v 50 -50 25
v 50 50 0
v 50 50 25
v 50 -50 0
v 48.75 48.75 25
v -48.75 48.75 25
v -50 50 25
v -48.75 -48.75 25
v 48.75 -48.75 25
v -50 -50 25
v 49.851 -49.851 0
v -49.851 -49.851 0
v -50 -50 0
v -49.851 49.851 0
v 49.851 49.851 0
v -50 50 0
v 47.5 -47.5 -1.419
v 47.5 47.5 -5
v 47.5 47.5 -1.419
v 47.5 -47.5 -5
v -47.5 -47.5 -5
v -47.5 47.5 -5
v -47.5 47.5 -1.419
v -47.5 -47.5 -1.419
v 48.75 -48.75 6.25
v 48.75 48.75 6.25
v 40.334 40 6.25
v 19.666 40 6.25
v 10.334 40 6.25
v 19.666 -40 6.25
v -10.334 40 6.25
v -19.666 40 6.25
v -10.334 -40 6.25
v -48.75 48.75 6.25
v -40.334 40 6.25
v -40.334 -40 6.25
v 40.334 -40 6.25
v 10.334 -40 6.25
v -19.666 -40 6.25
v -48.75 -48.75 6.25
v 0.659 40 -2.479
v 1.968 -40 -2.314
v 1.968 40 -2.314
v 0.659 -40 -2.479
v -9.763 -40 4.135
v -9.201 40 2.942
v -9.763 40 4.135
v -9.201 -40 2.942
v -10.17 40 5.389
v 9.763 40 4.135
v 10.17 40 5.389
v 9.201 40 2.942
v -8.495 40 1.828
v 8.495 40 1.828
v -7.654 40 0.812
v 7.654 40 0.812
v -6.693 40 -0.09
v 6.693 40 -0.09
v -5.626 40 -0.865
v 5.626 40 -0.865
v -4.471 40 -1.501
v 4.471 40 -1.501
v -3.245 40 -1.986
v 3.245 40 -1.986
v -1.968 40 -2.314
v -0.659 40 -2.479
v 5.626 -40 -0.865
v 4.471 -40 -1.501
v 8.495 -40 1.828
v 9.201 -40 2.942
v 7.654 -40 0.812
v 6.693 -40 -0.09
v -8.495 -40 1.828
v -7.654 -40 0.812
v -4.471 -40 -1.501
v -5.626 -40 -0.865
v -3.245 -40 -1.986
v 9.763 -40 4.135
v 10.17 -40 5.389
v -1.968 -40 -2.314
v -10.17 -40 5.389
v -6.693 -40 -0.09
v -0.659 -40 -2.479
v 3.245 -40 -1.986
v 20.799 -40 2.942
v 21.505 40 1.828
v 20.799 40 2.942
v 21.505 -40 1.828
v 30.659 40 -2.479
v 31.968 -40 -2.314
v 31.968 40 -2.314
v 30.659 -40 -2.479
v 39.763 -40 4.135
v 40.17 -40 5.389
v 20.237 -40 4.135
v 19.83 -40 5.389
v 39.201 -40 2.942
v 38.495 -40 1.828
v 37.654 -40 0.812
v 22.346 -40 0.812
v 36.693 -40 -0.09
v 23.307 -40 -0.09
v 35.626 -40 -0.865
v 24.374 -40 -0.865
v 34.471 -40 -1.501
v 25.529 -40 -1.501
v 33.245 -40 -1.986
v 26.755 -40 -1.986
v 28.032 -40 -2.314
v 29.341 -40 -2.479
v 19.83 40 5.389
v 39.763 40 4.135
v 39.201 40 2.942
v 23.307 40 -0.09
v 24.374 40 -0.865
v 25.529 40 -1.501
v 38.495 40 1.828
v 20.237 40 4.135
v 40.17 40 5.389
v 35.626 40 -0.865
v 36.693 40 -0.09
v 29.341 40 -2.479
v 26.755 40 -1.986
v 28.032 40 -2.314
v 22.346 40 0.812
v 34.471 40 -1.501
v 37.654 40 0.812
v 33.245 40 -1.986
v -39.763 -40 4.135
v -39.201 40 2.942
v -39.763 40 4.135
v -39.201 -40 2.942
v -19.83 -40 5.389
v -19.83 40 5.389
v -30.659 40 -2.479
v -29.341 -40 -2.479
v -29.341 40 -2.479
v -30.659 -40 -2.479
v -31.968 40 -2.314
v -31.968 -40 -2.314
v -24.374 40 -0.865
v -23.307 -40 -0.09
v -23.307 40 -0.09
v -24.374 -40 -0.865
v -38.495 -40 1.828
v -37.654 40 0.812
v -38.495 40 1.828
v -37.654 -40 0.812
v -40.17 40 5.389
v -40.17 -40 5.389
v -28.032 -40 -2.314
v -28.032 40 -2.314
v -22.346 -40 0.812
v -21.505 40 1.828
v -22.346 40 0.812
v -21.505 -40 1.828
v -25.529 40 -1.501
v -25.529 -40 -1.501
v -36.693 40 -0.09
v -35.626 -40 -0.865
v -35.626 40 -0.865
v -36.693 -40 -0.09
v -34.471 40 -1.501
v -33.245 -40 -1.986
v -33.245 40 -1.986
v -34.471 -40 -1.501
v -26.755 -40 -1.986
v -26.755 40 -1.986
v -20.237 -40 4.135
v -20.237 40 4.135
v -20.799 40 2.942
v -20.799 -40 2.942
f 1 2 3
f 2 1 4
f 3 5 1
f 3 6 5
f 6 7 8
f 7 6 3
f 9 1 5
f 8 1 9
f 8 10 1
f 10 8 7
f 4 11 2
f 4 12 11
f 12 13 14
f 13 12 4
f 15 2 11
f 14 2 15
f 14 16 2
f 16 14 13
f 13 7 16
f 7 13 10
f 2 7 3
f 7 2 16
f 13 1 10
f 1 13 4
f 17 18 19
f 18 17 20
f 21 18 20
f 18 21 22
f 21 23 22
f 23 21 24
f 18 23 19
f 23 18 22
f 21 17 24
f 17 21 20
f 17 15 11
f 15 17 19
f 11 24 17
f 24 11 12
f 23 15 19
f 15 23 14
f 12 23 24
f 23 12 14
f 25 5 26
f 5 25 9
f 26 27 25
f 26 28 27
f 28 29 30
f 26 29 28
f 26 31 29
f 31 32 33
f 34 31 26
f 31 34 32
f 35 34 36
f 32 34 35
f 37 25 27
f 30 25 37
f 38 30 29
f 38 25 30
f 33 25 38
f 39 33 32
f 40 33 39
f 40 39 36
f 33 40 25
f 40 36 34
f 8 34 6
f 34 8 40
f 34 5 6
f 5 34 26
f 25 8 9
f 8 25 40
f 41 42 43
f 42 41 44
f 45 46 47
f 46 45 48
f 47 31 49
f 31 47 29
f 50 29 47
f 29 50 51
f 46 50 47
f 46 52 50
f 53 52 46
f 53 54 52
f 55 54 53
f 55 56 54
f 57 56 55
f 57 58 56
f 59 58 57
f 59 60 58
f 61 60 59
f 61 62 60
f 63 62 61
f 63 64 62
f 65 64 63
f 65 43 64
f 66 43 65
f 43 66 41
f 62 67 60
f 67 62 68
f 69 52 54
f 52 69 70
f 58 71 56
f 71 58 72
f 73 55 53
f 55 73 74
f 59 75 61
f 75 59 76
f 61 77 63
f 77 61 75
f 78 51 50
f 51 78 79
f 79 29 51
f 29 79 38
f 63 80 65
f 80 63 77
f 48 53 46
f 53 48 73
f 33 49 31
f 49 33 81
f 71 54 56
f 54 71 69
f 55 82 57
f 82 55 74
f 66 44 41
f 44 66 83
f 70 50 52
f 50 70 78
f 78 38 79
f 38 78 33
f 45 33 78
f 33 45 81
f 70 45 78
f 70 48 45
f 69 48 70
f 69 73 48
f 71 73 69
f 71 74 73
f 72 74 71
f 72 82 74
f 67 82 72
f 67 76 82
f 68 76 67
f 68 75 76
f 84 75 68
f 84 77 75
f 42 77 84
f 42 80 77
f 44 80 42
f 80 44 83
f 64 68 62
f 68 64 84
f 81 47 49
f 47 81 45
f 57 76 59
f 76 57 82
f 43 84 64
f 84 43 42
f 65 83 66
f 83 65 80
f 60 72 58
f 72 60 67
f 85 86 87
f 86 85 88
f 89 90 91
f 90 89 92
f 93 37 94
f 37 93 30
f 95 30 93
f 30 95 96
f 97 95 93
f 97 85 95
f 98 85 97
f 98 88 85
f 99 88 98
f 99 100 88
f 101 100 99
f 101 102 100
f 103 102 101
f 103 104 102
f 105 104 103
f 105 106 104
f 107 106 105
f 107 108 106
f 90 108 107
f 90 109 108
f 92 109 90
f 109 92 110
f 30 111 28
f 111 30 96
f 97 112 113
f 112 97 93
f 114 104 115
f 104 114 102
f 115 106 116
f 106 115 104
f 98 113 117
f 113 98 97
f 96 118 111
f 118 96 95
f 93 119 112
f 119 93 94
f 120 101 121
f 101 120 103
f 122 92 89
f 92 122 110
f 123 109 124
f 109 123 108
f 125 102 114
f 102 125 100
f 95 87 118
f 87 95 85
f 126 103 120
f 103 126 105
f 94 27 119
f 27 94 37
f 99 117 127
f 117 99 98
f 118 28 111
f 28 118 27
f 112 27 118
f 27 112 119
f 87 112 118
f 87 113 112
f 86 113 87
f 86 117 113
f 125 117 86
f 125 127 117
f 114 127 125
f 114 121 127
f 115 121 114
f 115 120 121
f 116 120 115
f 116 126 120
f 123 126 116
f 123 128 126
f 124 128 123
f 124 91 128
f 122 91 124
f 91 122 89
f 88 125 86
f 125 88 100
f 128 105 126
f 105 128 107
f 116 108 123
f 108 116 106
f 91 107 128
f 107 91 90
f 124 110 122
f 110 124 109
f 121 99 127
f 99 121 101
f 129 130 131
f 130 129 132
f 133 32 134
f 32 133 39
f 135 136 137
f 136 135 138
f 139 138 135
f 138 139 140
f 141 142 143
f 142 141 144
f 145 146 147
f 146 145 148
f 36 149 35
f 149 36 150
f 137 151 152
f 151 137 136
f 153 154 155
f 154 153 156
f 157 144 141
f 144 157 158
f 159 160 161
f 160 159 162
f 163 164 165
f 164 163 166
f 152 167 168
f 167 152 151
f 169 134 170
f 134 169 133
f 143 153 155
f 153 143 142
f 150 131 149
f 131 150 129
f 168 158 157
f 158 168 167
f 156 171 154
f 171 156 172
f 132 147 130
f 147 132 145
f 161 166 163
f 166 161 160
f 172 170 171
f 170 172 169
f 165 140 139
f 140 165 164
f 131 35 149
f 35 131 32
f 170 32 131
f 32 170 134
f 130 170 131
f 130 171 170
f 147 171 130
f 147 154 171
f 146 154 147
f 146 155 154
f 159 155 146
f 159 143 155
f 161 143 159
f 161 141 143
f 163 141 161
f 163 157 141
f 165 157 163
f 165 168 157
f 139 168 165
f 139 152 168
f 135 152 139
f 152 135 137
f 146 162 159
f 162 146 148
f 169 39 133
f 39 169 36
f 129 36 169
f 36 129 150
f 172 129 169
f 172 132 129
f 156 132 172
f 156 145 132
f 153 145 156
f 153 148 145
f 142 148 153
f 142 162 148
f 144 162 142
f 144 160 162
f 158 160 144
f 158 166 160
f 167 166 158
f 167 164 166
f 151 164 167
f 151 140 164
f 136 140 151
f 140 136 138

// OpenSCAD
$fn=50;
H=25;
H2=5;
SIDE=100;
D=2;
D2=2.5;

difference() {
    union() {
        translate([0,0,H/2]) cube([SIDE,SIDE,H], center=true ); // Box 100x100x40
        translate([0,0,-H2/2]) cube([SIDE-2*D2,SIDE-2*D2,H2],center=true);
        translate([0,0,-2]) rotate([0,0,45]) cylinder(h=2,d1=1.35*(SIDE-D2),d2=1.41*SIDE,$fn=4);    // Chamfer
    }
    translate([0,0, H]) cube([SIDE-D2,SIDE-D2,1.5*H],center=true);

    translate([  0,0, 8]) rotate([90,0,0]) cylinder(d=21,h=80, center=true);
    translate([ 30,0, 8]) rotate([90,0,0]) cylinder(d=21,h=80, center=true);
    translate([-30,0, 8]) rotate([90,0,0]) cylinder(d=21,h=80, center=true);
   
//    translate([0,-100,0]) cube([300,200,300],center=true); // Tester
}
